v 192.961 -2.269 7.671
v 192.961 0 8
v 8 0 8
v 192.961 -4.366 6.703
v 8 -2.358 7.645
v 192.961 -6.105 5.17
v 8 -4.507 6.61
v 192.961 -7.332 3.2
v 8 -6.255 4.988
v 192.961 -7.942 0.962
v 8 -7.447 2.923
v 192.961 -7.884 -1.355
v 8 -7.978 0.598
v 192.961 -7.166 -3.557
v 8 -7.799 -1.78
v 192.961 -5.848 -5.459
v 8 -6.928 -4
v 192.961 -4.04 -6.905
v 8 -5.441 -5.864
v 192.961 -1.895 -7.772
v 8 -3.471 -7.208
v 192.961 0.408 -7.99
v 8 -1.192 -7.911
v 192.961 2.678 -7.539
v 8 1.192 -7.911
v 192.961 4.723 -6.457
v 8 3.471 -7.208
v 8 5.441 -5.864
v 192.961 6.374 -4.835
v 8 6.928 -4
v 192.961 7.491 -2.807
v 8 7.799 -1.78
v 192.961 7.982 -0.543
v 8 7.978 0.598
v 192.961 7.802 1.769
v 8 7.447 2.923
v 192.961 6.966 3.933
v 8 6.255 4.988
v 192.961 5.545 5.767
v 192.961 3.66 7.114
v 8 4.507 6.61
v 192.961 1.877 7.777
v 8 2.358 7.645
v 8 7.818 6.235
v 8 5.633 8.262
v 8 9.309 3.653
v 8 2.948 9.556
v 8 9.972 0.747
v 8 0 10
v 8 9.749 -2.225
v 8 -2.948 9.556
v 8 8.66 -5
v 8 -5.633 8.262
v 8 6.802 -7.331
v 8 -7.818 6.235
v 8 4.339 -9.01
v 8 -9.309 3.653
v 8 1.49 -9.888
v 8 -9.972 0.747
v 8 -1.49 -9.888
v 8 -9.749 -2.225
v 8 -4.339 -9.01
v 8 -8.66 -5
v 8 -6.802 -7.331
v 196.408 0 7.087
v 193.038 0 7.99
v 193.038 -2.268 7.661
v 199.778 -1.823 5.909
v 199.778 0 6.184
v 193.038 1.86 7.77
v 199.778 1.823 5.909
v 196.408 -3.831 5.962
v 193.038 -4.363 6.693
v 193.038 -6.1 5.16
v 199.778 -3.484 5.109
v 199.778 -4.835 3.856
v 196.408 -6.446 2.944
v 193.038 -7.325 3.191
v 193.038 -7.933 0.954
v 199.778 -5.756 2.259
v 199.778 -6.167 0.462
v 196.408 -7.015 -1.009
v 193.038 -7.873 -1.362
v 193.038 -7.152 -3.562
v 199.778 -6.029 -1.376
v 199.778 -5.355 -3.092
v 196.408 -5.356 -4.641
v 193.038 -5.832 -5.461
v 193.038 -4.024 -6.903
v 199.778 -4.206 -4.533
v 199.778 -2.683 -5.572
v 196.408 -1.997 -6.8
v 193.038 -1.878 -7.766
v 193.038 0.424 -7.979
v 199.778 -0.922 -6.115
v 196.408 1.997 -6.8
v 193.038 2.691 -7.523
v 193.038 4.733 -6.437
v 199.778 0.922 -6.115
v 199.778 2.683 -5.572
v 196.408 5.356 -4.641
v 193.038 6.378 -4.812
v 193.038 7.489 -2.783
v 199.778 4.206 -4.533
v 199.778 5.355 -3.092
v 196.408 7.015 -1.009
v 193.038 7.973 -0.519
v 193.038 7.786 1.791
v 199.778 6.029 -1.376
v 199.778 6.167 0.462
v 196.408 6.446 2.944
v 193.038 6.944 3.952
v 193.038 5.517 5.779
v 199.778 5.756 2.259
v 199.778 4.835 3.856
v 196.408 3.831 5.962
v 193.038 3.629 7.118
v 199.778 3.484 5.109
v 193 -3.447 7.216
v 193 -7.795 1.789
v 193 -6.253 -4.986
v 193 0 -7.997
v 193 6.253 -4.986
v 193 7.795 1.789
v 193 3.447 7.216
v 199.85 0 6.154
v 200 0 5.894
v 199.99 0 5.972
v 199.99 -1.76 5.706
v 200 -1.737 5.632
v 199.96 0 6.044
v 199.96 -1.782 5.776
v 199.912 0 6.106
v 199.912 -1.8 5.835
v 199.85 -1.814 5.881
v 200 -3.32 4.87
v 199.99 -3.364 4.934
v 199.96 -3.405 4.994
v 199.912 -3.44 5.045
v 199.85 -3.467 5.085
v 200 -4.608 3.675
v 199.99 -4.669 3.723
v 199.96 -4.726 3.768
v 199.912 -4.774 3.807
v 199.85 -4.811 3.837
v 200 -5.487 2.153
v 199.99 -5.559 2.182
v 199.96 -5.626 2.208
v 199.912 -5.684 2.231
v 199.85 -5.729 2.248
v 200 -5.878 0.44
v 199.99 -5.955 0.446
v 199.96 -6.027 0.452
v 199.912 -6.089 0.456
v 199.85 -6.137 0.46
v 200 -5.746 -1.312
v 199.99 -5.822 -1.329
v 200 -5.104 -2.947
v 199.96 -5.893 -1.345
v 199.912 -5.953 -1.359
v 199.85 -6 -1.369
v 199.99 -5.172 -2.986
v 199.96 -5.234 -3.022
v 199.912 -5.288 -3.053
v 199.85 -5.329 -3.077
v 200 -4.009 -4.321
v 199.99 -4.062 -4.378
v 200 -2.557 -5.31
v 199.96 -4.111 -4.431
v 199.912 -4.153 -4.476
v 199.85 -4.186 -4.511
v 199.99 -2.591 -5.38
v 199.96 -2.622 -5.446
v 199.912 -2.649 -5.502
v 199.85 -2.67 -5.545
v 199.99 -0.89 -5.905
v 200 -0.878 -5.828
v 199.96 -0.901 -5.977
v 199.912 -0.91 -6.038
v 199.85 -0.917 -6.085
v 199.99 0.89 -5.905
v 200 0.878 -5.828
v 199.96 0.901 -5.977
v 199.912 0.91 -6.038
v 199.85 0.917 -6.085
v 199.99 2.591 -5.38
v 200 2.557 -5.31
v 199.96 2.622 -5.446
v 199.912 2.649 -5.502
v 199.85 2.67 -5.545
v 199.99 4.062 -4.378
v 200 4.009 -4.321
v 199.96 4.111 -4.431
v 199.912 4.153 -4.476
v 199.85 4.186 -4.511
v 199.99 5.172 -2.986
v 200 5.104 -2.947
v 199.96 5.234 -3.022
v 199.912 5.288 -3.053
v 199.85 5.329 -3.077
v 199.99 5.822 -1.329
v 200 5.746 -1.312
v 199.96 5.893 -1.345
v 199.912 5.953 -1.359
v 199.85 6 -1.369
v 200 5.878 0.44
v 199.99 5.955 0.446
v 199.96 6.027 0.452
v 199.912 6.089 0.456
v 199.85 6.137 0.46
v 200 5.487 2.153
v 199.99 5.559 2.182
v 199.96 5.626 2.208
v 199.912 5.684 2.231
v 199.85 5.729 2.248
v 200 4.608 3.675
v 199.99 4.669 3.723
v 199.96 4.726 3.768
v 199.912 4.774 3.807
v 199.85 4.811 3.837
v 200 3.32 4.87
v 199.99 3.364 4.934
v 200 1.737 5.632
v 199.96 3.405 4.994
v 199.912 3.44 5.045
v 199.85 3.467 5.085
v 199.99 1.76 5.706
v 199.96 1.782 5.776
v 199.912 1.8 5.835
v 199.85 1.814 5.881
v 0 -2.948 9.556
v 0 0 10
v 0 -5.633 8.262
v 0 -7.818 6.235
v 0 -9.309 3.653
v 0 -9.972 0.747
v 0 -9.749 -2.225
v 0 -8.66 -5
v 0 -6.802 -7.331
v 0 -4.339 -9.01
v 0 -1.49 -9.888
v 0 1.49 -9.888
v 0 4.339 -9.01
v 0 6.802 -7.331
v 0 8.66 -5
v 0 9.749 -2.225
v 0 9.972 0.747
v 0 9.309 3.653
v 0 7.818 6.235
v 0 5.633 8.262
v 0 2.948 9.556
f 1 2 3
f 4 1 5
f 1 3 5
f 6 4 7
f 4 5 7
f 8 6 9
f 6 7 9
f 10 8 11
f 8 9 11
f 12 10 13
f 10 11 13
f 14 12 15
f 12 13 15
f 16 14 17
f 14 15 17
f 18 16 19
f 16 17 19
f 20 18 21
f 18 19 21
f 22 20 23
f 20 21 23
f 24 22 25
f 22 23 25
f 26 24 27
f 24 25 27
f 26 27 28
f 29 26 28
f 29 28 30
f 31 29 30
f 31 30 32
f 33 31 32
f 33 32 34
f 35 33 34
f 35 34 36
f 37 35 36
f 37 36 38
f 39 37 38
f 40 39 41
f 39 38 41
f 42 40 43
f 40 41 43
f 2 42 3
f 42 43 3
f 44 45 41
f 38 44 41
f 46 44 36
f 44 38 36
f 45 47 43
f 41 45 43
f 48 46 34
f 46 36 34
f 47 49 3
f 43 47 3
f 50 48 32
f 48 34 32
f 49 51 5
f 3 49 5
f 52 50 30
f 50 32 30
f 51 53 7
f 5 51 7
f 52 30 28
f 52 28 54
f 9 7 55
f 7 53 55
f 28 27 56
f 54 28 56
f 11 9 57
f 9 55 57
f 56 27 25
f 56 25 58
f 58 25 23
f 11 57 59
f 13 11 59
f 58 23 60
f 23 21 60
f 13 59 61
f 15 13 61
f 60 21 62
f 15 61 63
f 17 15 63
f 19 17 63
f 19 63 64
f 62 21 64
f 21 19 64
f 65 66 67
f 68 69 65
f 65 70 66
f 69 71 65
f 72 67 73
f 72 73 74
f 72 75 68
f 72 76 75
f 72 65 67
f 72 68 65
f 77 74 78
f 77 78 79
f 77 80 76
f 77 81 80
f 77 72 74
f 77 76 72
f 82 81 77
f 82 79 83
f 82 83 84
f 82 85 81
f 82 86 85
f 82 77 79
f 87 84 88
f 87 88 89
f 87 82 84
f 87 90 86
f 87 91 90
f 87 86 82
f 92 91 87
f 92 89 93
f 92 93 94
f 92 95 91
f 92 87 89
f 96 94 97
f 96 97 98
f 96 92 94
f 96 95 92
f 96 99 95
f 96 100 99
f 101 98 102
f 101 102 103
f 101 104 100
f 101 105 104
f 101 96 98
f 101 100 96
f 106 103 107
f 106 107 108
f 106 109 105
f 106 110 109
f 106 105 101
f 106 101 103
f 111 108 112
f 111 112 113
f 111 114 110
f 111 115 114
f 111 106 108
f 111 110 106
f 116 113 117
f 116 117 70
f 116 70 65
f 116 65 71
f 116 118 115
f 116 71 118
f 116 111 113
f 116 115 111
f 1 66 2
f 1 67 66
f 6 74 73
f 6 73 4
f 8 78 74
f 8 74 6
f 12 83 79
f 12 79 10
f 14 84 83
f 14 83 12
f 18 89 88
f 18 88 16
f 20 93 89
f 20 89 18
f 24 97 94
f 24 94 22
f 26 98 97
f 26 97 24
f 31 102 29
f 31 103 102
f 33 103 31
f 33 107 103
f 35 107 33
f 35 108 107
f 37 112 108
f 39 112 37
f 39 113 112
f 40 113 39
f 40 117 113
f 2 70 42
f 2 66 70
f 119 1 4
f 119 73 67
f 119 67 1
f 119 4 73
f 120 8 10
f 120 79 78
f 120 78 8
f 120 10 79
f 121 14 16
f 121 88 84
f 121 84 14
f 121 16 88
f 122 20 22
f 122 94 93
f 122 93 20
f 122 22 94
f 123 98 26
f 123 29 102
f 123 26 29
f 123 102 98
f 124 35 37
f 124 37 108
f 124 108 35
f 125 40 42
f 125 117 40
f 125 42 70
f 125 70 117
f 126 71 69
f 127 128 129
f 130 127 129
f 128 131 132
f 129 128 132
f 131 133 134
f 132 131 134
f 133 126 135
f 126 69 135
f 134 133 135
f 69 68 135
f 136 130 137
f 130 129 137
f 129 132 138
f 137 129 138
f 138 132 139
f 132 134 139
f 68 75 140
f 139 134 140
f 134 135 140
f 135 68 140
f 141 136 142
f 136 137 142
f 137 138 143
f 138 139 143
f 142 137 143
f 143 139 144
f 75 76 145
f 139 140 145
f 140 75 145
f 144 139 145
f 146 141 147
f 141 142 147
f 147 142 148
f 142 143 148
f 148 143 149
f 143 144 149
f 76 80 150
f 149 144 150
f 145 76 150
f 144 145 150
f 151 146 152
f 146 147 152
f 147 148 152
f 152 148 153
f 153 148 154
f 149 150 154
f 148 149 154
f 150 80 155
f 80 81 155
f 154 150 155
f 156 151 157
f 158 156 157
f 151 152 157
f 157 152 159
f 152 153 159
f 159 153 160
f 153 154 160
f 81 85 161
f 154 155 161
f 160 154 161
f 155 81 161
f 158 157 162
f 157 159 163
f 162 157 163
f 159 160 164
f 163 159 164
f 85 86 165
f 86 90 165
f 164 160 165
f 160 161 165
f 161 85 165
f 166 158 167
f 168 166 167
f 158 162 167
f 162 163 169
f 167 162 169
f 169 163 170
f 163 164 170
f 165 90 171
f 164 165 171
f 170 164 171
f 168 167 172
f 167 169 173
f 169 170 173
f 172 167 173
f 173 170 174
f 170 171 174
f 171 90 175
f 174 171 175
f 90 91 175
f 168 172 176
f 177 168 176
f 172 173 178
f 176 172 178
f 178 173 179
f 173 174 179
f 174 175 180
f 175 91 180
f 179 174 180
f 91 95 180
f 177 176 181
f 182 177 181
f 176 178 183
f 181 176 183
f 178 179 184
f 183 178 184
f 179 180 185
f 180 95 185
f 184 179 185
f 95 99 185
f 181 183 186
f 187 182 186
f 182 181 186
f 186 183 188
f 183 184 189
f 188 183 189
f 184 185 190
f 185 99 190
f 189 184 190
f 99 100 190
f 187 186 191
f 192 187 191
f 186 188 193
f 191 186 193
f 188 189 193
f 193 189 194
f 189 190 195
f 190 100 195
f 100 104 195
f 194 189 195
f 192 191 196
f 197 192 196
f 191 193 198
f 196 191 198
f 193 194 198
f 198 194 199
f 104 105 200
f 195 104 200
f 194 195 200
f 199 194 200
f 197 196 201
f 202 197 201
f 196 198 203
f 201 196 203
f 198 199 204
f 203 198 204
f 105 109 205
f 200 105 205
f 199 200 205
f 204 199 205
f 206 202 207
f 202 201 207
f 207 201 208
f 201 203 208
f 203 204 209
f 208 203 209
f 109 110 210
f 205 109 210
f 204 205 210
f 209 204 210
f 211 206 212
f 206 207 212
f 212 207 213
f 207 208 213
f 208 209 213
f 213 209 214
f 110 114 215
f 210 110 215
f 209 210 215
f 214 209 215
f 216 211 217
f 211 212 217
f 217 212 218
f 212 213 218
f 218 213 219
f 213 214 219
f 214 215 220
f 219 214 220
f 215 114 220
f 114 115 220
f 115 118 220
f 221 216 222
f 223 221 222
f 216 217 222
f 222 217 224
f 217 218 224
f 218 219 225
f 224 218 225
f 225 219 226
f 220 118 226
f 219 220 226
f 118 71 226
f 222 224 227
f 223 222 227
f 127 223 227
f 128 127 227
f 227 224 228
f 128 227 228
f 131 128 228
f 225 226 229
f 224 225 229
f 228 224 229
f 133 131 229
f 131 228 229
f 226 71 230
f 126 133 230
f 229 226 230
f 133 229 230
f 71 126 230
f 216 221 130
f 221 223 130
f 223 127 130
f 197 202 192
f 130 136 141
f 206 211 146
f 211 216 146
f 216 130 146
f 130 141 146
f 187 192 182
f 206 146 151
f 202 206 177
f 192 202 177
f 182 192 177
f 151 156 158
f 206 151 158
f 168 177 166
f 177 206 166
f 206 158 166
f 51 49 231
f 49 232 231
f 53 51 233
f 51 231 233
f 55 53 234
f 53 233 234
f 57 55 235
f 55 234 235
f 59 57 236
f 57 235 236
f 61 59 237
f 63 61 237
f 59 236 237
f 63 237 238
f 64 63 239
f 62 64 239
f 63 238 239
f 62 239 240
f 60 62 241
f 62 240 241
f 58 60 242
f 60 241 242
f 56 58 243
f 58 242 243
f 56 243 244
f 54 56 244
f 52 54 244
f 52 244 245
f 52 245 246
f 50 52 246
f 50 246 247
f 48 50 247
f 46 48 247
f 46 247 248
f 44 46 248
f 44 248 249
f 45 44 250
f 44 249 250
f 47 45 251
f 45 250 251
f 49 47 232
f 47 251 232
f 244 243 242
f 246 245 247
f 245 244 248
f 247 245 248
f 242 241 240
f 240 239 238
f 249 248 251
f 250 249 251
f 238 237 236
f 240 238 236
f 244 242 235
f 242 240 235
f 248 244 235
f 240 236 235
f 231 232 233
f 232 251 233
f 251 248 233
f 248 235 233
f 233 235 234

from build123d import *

# Parameters (mm, degrees)
CHAMFER1_SIZE  = 7
CHAMFER1_SIZE2 = 1.875644347
FILLET1_R      = 0.3


with BuildPart() as part:
    # Sketch1 → Revolve1 (revolve)
    with BuildSketch(Plane.XY, mode=Mode.PRIVATE) as revolve1_sk:
        Polygon((0, 0), (200, 0), (200, 8), (8, 8), (8, 10), (0, 10), align=None)
    revolve(revolve1_sk.sketch.rotate(Axis((0, 0, 0), (1, 0, 0)), 90), axis=Axis((0, 0, 0), (1, 0, 0)))

    # Chamfer1
    chamfer1_edges = [part.edges().sort_by_distance(p)[0] for p in [
        (200, 0, -8),
    ]]
    chamfer1_side = [part.faces().sort_by_distance(p)[0] for p in [
        (104, 0, -8),
    ]]
    chamfer(chamfer1_edges, length=CHAMFER1_SIZE, length2=CHAMFER1_SIZE2, reference=chamfer1_side[0])

    # Fillet1
    fillet1_edges = [part.edges().sort_by_distance(p)[0] for p in [
        (193, 0, -8),
        (200, 0, -6.124355653),
    ]]
    fillet(fillet1_edges, radius=FILLET1_R)


solid = part.part
